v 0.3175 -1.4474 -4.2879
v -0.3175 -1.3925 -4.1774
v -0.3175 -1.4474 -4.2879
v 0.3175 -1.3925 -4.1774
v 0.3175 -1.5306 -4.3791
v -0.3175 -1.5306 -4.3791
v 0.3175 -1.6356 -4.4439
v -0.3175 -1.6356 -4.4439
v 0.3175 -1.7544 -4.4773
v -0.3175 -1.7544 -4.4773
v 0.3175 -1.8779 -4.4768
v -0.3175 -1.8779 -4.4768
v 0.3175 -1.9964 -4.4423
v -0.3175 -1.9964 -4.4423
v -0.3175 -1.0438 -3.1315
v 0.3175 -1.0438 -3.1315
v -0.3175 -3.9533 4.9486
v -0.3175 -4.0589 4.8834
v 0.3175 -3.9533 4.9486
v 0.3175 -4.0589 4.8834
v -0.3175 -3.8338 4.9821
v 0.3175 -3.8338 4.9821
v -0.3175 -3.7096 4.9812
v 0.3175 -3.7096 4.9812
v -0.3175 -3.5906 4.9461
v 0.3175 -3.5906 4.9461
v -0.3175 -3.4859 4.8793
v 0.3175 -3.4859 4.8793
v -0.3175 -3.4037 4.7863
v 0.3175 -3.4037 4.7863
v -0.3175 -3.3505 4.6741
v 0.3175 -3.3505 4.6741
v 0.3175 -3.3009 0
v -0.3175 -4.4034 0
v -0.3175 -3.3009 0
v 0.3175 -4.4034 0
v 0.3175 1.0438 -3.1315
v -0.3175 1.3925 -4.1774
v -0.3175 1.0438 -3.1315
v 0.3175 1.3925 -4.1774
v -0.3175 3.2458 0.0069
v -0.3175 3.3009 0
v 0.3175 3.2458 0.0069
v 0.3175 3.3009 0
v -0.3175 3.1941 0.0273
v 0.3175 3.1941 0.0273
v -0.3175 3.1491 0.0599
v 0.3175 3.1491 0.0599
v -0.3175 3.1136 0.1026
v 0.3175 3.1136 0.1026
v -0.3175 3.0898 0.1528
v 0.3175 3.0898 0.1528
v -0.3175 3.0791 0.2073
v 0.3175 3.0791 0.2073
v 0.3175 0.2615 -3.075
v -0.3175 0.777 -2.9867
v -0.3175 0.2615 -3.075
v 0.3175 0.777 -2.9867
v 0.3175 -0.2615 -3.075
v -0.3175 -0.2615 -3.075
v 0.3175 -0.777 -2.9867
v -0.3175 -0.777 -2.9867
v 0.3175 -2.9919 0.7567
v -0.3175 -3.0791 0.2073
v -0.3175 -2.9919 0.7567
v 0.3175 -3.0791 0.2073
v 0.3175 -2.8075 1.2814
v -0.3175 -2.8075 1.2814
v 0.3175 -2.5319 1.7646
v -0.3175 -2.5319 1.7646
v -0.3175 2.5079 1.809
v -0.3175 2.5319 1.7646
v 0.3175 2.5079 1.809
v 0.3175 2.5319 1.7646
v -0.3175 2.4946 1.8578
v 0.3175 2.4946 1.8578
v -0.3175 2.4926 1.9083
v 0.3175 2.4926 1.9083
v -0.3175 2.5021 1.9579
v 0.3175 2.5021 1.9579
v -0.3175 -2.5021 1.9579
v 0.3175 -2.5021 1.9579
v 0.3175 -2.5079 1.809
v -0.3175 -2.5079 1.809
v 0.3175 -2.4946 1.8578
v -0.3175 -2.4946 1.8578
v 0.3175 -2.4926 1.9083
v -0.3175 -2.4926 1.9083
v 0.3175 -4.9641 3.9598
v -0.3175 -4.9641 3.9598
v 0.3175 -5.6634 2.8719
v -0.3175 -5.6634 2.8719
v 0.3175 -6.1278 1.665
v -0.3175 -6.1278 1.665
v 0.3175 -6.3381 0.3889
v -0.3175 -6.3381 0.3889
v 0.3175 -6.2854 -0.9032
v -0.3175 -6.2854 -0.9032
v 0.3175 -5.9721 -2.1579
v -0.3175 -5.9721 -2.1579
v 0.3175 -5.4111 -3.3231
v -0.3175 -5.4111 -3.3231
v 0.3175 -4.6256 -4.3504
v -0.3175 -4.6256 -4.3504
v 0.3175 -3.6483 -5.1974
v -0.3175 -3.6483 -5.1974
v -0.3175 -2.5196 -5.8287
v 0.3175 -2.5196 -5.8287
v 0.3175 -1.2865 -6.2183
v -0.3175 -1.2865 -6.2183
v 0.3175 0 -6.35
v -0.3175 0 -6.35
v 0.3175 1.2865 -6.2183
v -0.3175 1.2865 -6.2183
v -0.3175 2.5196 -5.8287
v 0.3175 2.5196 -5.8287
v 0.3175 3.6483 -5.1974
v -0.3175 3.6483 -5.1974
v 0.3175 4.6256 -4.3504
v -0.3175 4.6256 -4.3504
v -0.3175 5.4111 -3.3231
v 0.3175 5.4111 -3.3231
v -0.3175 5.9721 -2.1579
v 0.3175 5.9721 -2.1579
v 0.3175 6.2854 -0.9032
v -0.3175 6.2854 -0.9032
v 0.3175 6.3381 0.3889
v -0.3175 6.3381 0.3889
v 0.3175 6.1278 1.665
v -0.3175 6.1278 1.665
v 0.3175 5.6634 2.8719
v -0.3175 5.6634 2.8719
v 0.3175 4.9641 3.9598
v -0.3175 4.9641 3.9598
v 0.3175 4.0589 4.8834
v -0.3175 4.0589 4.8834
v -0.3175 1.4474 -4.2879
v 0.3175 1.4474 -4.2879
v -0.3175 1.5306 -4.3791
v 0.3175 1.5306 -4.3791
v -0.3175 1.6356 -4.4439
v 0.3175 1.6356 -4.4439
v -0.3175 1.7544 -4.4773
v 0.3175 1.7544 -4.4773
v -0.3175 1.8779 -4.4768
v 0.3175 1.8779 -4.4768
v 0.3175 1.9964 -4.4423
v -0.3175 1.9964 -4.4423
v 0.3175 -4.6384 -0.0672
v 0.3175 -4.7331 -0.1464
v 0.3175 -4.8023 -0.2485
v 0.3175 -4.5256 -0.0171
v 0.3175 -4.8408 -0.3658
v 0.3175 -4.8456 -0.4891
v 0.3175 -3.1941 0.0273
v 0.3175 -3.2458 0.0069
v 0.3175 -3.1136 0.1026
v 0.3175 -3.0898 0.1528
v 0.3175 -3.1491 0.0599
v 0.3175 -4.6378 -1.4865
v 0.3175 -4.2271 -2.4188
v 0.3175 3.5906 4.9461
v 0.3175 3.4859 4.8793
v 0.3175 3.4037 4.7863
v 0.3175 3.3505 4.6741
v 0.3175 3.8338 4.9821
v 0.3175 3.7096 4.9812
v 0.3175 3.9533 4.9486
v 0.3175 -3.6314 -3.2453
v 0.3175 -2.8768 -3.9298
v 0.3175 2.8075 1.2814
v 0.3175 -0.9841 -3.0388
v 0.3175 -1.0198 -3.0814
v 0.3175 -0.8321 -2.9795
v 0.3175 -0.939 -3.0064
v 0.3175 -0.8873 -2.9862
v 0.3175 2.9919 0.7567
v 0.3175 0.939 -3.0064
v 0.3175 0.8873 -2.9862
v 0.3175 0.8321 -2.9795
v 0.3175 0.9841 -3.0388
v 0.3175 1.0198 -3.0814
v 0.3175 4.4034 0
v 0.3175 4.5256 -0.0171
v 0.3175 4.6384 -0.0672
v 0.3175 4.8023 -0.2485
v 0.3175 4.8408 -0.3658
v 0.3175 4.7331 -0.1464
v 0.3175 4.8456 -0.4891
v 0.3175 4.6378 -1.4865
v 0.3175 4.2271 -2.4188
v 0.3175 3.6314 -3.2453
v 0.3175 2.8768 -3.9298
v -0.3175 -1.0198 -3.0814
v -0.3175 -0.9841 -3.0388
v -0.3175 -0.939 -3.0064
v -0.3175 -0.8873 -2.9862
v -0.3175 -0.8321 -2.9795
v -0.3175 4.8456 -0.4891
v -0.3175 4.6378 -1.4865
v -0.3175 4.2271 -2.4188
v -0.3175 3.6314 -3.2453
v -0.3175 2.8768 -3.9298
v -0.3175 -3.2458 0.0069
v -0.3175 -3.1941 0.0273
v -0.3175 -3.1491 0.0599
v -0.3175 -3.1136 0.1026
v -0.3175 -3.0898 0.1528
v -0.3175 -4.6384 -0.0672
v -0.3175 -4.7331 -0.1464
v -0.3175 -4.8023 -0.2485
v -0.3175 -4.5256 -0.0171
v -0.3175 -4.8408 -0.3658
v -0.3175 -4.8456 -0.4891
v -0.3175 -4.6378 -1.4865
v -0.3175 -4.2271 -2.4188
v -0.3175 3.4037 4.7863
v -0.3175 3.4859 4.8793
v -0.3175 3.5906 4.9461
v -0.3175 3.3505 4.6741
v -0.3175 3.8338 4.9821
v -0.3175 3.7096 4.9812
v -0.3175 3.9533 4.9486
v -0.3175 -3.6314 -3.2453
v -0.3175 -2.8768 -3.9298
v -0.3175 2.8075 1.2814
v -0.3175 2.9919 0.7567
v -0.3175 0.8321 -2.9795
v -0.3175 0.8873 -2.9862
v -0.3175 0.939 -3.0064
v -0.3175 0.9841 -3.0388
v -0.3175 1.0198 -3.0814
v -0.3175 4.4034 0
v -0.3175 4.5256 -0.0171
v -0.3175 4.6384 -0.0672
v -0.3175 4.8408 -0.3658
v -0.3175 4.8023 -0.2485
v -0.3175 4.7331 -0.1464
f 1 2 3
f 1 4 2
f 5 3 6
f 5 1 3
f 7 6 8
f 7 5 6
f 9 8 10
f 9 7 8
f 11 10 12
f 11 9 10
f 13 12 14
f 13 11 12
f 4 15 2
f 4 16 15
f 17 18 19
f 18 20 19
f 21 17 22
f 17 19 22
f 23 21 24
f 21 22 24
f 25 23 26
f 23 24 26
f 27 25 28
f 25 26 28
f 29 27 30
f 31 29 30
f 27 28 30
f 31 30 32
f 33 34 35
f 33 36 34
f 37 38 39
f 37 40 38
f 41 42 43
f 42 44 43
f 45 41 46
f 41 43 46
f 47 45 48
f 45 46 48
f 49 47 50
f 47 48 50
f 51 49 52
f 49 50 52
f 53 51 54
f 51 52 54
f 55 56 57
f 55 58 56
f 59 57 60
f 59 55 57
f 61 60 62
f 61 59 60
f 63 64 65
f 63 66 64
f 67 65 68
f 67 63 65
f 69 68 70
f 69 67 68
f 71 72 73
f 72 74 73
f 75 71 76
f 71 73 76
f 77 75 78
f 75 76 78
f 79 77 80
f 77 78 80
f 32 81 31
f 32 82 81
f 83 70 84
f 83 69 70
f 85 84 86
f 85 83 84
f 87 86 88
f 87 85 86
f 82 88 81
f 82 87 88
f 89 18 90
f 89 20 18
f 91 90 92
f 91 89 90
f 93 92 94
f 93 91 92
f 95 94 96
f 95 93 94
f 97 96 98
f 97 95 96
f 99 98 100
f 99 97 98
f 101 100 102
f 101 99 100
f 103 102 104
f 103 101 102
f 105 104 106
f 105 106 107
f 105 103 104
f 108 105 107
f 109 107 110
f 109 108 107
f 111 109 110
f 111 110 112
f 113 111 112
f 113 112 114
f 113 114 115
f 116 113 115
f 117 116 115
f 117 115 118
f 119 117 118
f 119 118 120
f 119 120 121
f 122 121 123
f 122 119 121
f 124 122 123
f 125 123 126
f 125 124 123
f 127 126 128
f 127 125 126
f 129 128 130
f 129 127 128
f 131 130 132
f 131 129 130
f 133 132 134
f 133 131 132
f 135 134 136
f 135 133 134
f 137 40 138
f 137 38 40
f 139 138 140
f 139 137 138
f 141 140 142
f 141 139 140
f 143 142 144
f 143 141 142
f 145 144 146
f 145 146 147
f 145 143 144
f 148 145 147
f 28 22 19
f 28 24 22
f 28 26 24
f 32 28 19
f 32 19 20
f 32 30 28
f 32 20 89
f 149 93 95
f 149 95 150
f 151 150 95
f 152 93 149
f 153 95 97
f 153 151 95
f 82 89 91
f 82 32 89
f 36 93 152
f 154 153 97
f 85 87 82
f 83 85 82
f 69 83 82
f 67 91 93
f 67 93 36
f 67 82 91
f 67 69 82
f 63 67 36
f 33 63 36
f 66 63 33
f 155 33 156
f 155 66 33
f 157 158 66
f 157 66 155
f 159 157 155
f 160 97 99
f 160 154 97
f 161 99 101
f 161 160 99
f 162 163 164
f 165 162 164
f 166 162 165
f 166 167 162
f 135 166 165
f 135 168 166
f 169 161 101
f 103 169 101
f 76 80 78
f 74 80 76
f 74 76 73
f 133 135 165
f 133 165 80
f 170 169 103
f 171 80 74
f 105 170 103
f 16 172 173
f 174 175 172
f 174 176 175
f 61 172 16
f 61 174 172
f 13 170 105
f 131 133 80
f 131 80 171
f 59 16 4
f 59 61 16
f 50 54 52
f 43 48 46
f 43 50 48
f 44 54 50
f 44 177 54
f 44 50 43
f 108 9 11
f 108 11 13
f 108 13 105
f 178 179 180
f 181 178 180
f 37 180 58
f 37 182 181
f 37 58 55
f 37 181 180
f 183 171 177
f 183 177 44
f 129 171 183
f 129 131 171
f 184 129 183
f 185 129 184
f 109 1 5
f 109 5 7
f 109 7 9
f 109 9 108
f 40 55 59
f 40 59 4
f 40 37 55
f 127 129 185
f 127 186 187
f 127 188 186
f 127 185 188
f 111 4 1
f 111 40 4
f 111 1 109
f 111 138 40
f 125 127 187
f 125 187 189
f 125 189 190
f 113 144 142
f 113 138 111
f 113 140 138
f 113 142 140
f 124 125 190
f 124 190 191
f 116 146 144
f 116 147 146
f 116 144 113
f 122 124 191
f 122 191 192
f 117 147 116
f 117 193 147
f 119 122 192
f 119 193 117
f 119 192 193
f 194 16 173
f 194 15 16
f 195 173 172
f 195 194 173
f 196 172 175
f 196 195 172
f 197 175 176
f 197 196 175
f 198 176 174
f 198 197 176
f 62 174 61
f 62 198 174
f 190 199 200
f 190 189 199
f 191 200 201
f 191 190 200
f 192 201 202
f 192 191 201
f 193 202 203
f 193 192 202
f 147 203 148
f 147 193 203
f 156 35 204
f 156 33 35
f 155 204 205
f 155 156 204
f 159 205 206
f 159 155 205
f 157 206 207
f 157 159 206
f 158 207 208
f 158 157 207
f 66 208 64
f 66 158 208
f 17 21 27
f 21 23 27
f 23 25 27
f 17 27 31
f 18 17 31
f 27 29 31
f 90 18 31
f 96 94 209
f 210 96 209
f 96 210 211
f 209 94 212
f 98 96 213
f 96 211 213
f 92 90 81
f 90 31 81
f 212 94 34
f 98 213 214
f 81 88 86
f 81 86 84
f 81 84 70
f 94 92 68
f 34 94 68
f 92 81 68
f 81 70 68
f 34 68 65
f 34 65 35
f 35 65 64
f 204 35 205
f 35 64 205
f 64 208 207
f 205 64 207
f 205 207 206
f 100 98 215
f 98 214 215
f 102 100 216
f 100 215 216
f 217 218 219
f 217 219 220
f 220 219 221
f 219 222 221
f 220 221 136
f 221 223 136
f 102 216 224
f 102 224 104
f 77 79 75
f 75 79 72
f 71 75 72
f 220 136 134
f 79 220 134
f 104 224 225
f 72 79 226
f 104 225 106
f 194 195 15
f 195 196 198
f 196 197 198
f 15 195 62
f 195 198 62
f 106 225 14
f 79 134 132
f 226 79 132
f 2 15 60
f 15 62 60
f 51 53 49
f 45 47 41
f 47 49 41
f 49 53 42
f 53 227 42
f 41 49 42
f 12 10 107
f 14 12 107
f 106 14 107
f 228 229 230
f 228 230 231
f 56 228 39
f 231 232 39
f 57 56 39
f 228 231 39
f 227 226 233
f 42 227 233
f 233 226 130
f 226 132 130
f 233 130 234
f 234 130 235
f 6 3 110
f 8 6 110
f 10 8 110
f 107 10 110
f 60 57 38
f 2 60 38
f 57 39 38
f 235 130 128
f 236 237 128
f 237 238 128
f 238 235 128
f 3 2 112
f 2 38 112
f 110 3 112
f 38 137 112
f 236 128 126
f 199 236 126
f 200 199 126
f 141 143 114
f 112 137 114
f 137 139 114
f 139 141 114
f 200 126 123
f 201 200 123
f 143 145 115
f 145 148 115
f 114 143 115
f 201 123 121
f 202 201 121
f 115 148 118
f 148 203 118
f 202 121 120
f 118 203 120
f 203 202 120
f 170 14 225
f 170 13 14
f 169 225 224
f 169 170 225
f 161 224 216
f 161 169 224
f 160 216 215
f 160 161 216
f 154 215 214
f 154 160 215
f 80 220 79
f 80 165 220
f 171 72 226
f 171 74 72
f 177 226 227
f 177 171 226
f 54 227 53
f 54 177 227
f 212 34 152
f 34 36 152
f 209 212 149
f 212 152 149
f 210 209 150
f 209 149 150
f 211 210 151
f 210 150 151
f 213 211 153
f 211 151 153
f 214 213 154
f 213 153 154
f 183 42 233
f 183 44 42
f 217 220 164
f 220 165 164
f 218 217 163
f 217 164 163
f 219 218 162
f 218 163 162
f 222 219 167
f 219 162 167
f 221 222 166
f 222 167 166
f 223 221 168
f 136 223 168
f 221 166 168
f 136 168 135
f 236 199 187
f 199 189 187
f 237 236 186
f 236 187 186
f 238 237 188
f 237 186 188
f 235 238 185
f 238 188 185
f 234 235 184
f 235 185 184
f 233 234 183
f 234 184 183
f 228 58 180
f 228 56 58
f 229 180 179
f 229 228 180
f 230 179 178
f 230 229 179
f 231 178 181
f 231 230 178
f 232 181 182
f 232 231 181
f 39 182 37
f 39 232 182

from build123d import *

# Parameters (mm, degrees)
BOSS_EXTRUDE1_DEPTH      = 0.3175
BOSS_EXTRUDE1_DEPTH_BACK = 0.3175
FILLET1_R                = 0.4445
FILLET2_R                = 0.22225


with BuildPart() as part:
    # Sketch3 → Boss-Extrude1 (new body, two sides)
    with BuildSketch(Plane(origin=(0, 0, 0), x_dir=(0, 0, -1), z_dir=(1, 0, 0))) as boss_extrude1_sk:
        with BuildLine():
            Line((2.927731526, -0.975910509), (4.620320242, -1.540106747))
            ThreePointArc((4.620320242, -1.540106747), (2.847682435, -3.950948327), (0, -4.870245161))
            Line((0, -4.870245161), (0, -3.0861))
            ThreePointArc((0, -3.0861), (-0.975910509, -2.927731526), (-1.85166, -2.46888))
            Line((-1.85166, -2.46888), (-5.273248683, -3.537703821))
            ThreePointArc((-5.273248683, -3.537703821), (6.35, 0), (-5.273248683, 3.537703821))
            Line((-5.273248683, 3.537703821), (-1.85166, 2.46888))
            ThreePointArc((-1.85166, 2.46888), (-0.975910509, 2.927731526), (0, 3.0861))
            Line((0, 3.0861), (0, 4.870245161))
            ThreePointArc((0, 4.870245161), (2.847682435, 3.950948327), (4.620320242, 1.540106747))
            Line((4.620320242, 1.540106747), (2.927731526, 0.975910509))
            ThreePointArc((2.927731526, 0.975910509), (3.0861, 0), (2.927731526, -0.975910509))
        make_face()
    extrude(amount=BOSS_EXTRUDE1_DEPTH)
    extrude(boss_extrude1_sk.sketch, amount=-BOSS_EXTRUDE1_DEPTH_BACK)

    # Fillet1
    fillet1_edges = [part.edges().sort_by_distance(p)[0] for p in [
        (0, 1.540106747, -4.620320242),
        (0, 4.870245161, 0),
        (0, 3.537703821, 5.273248683),
        (0, -3.537703821, 5.273248683),
        (0, -4.870245161, 0),
        (0, -1.540106747, -4.620320242),
    ]]
    fillet(fillet1_edges, radius=FILLET1_R)

    # Fillet2
    fillet2_edges = [part.edges().sort_by_distance(p)[0] for p in [
        (0, 0.975910509, -2.927731526),
        (0, 3.0861, 0),
        (0, 2.46888, 1.85166),
        (0, -2.46888, 1.85166),
        (0, -3.0861, 0),
        (0, -0.975910509, -2.927731526),
    ]]
    fillet(fillet2_edges, radius=FILLET2_R)


solid = part.part
